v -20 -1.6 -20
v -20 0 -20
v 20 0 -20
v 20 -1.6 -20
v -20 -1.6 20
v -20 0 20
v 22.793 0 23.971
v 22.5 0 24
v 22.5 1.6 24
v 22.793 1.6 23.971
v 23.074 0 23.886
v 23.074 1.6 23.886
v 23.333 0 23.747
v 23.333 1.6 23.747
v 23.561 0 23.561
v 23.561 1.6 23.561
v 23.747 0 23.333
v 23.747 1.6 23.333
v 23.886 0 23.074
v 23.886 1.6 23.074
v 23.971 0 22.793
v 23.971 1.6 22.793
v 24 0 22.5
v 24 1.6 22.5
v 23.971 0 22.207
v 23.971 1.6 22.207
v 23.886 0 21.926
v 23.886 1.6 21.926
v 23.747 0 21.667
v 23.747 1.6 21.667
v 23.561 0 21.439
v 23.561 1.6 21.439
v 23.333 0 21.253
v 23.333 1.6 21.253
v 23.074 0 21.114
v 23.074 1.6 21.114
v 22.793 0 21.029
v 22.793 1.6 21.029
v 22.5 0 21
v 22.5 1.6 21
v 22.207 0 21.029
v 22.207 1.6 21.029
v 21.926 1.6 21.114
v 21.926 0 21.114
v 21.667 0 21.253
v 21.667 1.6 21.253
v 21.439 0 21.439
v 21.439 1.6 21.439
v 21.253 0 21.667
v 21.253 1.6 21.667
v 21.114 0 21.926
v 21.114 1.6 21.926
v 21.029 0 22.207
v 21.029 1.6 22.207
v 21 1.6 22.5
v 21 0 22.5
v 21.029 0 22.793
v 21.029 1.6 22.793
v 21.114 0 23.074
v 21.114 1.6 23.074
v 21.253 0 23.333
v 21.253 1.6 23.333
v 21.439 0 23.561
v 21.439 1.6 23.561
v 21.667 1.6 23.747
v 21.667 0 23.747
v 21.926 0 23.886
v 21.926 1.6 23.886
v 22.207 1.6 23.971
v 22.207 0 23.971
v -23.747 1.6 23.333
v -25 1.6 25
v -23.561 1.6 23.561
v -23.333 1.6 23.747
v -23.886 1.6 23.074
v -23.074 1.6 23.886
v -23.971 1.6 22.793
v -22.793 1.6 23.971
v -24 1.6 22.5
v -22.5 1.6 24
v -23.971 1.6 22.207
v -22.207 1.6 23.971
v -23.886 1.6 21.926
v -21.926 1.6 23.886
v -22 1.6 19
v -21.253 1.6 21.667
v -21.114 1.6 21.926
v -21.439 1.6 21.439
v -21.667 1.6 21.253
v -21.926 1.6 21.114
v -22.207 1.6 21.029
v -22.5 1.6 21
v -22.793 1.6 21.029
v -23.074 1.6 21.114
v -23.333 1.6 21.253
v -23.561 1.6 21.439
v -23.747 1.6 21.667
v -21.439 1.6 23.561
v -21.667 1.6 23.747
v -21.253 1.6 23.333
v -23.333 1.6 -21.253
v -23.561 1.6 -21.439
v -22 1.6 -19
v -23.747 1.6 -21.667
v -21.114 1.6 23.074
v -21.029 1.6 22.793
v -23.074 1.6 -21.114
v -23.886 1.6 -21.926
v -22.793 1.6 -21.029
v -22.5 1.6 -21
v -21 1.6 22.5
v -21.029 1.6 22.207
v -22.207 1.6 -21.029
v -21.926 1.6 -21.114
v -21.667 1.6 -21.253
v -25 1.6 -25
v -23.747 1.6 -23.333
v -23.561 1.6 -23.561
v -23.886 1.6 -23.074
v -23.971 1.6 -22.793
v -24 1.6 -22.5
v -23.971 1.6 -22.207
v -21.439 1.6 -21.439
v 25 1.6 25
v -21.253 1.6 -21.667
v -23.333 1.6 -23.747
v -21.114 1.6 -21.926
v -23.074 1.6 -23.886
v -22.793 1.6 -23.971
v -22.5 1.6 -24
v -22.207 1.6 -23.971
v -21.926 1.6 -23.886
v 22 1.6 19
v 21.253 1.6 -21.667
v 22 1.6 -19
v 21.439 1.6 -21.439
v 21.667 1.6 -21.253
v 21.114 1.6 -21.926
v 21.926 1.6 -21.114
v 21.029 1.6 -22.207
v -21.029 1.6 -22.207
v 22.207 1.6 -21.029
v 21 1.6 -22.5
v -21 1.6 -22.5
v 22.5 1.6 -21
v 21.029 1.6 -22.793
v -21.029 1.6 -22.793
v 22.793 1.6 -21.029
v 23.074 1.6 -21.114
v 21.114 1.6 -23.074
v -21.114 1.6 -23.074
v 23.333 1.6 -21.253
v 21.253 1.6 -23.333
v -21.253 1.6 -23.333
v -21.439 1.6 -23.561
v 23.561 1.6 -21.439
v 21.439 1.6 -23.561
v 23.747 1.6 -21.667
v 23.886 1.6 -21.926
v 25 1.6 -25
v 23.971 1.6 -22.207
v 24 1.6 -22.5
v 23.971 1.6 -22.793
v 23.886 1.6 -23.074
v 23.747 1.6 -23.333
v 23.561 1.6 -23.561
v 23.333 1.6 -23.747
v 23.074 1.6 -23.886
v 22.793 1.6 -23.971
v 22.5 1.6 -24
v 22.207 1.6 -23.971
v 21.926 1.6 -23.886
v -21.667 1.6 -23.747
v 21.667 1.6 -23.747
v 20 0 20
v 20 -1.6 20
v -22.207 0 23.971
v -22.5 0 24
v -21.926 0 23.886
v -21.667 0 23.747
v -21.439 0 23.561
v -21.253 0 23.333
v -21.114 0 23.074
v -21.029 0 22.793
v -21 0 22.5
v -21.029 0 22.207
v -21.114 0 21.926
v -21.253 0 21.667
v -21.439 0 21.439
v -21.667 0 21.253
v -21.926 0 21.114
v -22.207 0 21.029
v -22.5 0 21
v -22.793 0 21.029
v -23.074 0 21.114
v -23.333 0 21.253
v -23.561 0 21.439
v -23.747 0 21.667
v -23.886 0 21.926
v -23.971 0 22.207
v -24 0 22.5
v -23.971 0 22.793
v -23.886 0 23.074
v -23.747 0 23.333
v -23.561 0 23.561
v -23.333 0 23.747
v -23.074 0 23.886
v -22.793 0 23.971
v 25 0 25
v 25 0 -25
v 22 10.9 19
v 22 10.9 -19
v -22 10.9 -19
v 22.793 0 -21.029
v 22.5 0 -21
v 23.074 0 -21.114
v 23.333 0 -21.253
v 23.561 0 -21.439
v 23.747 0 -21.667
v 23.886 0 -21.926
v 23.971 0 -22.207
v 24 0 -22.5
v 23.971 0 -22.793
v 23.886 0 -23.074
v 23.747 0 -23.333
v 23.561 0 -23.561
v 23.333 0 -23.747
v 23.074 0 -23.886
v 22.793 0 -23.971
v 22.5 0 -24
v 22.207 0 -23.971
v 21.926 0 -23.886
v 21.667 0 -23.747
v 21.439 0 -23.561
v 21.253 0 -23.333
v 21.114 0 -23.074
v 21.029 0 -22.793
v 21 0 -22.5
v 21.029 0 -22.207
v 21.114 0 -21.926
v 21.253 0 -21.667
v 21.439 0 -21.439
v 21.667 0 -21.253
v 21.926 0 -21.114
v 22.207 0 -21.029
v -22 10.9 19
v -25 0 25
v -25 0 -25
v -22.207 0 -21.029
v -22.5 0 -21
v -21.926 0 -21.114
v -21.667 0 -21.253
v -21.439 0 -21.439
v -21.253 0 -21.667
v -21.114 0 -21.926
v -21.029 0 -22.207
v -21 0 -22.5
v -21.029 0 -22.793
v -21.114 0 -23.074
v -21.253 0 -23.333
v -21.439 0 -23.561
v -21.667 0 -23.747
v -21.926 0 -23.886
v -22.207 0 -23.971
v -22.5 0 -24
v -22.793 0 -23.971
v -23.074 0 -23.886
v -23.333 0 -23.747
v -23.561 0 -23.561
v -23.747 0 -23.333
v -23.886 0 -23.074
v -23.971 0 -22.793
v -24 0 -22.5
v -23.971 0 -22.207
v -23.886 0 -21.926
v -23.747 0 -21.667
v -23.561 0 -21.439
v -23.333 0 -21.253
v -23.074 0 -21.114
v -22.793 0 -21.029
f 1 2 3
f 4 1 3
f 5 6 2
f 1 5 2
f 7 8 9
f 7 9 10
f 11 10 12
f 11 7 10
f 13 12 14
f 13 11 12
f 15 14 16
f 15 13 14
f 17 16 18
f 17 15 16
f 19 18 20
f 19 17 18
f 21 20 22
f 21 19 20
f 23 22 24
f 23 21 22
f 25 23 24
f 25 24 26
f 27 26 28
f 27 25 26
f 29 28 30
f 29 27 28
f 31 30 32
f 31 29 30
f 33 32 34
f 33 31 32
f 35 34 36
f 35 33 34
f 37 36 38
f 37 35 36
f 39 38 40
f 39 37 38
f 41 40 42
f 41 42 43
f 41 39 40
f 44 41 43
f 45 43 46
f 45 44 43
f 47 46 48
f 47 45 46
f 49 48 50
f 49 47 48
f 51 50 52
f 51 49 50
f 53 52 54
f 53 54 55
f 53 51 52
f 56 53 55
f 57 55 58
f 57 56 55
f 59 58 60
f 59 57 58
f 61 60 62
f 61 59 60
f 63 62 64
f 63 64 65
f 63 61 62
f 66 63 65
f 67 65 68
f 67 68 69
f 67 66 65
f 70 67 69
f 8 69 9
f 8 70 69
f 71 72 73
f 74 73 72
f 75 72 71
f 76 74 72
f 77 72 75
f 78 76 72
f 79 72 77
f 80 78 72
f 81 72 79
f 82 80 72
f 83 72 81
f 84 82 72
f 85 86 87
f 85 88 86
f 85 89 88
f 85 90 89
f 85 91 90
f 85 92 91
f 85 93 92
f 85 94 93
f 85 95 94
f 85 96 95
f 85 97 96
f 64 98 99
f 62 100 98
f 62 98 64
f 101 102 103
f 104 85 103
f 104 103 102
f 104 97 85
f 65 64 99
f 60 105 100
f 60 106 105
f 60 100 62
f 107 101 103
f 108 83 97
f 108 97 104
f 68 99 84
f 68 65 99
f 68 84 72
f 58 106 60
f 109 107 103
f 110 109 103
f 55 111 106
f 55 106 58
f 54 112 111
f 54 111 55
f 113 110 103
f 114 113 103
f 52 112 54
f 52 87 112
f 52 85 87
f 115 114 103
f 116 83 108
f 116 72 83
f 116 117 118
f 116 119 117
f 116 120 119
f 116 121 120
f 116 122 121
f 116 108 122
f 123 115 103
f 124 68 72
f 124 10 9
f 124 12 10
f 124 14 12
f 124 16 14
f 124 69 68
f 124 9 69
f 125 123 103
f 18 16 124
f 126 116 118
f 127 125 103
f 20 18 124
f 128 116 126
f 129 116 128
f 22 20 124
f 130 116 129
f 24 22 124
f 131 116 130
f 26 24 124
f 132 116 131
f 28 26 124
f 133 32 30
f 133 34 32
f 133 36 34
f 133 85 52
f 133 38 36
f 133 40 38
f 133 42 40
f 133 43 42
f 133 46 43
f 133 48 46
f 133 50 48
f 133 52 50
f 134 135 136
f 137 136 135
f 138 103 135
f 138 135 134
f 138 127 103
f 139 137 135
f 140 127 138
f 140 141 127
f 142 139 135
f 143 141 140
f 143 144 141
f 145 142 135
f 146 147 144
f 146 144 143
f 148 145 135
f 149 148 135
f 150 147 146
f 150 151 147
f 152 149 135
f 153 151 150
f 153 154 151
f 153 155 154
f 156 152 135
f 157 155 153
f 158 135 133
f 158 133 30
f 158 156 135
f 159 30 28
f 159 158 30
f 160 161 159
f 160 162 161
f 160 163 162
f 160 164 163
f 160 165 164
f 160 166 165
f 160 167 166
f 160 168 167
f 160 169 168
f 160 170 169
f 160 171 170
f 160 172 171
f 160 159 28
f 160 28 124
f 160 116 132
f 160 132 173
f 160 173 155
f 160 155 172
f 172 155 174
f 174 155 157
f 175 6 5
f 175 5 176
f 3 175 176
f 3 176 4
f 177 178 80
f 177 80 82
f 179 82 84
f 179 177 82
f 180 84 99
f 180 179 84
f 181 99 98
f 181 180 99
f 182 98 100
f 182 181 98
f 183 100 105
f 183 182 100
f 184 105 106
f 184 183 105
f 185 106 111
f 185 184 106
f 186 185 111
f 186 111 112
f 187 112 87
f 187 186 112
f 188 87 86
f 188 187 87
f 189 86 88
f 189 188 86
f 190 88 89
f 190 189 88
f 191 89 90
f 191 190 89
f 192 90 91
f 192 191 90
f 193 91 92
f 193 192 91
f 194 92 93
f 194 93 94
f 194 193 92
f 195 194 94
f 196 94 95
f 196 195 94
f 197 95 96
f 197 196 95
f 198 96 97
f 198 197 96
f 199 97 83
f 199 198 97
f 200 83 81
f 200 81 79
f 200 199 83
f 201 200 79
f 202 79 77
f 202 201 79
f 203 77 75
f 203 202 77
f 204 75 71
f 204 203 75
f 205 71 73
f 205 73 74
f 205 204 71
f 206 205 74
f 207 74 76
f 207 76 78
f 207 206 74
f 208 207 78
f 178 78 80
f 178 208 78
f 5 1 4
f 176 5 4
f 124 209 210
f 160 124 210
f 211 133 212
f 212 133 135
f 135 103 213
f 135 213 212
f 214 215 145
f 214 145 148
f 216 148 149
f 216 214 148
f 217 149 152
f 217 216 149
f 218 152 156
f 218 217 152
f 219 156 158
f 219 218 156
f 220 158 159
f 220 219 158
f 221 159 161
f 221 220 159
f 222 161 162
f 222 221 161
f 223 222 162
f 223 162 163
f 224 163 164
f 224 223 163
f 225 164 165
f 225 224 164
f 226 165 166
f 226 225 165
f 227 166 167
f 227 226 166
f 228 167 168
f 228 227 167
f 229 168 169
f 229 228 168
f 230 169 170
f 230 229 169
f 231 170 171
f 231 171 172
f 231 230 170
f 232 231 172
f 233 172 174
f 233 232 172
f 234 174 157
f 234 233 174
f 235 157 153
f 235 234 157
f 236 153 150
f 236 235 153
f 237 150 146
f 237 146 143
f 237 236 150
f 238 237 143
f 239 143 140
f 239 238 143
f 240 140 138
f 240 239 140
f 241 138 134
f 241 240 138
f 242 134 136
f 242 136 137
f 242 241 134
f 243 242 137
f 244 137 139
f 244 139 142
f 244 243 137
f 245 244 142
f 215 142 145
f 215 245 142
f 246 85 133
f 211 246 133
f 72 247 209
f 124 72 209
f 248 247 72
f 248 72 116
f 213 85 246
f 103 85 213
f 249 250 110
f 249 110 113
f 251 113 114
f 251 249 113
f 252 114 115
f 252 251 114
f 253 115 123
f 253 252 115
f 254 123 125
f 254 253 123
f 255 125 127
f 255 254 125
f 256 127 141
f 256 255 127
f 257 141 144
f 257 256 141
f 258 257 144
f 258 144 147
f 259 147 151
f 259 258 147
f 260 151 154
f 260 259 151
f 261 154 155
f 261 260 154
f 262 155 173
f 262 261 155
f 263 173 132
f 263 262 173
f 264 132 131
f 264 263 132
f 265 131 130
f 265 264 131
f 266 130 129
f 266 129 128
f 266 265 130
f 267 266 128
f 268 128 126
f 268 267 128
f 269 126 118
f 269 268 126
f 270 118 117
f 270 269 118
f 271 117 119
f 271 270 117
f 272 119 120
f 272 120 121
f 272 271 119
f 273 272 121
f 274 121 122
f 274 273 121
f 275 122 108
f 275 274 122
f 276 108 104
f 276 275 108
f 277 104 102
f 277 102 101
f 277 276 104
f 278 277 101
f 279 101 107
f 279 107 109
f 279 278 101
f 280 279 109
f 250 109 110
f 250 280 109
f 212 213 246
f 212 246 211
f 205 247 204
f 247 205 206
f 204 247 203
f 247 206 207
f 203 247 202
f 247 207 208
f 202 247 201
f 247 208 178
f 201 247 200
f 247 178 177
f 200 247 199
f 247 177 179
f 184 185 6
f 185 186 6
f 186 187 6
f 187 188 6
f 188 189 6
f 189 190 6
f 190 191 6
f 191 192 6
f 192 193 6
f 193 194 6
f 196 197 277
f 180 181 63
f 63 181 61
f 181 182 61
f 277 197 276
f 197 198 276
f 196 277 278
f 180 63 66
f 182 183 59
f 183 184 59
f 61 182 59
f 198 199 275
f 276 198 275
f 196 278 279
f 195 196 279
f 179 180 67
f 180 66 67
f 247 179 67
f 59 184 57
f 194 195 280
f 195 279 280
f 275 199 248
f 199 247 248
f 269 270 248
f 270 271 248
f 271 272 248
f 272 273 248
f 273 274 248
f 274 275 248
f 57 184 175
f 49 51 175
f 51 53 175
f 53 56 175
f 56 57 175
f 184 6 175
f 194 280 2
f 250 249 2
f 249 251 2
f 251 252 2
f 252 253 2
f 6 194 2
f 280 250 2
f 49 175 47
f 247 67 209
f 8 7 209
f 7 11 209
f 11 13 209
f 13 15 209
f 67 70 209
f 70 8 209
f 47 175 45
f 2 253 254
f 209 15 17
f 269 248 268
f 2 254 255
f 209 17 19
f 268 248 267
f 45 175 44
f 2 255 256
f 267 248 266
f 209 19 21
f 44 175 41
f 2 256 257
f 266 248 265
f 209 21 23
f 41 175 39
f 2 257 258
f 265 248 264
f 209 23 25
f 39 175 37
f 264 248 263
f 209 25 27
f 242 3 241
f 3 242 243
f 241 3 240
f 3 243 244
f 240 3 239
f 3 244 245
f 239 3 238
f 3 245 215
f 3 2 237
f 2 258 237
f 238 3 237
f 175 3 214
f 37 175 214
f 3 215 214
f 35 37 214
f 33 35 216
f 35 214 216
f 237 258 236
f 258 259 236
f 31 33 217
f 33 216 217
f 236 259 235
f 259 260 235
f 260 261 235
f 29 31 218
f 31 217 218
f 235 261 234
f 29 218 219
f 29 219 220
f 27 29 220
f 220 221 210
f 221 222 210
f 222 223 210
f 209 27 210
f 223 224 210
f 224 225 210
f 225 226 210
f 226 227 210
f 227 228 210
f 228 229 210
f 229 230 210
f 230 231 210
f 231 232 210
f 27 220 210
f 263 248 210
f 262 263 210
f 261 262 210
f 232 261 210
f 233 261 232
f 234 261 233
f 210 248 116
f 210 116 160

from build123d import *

# Parameters (mm, degrees)
SK_BOARD_W              = 50
SK_BOARD_H              = 50
EX_BOARD_DEPTH          = 1.6
SK_MOUNTHOLES_4X_R      = 1.5
CUT_MOUNTHOLES_4X_DEPTH = 1.6
SK_COMPONENTS_W         = 44
SK_COMPONENTS_H         = 38
EX_COMPONENTS_DEPTH     = 9.3
SK_PINS_W               = 40
SK_PINS_H               = 40
EX_PINS_DEPTH           = 1.6


with BuildPart() as part:
    # SK_Board → EX_Board (new body)
    with BuildSketch(Plane(origin=(0, 0, 0), x_dir=(1, 0, 0), z_dir=(0, 1, 0))):
        Rectangle(SK_BOARD_W, SK_BOARD_H)
    extrude(amount=EX_BOARD_DEPTH)

    # SK_MountHoles_4x → CUT_MountHoles_4x (cut)
    with BuildSketch(Plane(origin=(0, 0, 0), x_dir=(1, 0, 0), z_dir=(0, 1, 0))):
        with Locations((22.5, -22.5)):
            Circle(SK_MOUNTHOLES_4X_R)
        with Locations((-22.5, -22.5)):
            Circle(SK_MOUNTHOLES_4X_R)
        with Locations((22.5, 22.5)):
            Circle(SK_MOUNTHOLES_4X_R)
        with Locations((-22.5, 22.5)):
            Circle(SK_MOUNTHOLES_4X_R)
    extrude(amount=CUT_MOUNTHOLES_4X_DEPTH, mode=Mode.SUBTRACT)

    # SK_Components → EX_Components (add)
    with BuildSketch(Plane(origin=(0, 1.6, 0), x_dir=(1, 0, 0), z_dir=(0, 1, 0))):
        Rectangle(SK_COMPONENTS_W, SK_COMPONENTS_H)
    extrude(amount=EX_COMPONENTS_DEPTH)

    # SK_Pins → EX_Pins (add)
    with BuildSketch(Plane(origin=(0, 0, 0), x_dir=(1, 0, 0), z_dir=(0, 1, 0))):
        Rectangle(SK_PINS_W, SK_PINS_H)
    extrude(amount=-EX_PINS_DEPTH)


solid = part.part
